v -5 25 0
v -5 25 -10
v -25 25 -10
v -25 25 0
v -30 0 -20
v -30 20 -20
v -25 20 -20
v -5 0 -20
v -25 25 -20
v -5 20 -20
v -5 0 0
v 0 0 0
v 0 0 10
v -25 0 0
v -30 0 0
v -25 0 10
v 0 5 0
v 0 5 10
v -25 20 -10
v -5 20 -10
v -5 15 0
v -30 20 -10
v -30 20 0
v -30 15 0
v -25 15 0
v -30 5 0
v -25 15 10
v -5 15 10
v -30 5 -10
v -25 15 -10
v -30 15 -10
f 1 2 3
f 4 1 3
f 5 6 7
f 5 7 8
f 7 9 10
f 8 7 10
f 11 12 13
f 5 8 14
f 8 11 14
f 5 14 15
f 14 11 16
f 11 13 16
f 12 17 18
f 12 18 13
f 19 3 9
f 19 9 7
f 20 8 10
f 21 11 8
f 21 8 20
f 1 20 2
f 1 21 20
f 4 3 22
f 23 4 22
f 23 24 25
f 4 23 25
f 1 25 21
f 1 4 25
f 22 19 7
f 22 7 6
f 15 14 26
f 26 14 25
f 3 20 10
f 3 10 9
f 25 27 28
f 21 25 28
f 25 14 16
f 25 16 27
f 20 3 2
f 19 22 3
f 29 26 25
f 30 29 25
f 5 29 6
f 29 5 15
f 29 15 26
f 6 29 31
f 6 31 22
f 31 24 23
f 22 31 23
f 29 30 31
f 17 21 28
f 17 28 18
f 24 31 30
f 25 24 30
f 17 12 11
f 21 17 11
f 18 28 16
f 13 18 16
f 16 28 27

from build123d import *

# Parameters (mm, degrees)
BOSS_EXTRUDE4_DEPTH  = 10
BOSS_EXTRUDE5_DEPTH  = 10
BOSS_EXTRUDE13_DEPTH = 10
SKETCH9_W            = 25
SKETCH9_H            = 20
BOSS_EXTRUDE14_DEPTH = 10
BOSS_EXTRUDE15_DEPTH = 10


with BuildPart() as part:
    # Sketch1 → Boss-Extrude4 (new body)
    with BuildSketch(Plane.XY):
        Polygon((-25, 0), (-25, 15), (-5, 15), (0, 5), (0, 0), align=None)
    extrude(amount=BOSS_EXTRUDE4_DEPTH)

    # Sketch3 → Boss-Extrude5 (add)
    with BuildSketch(Plane(origin=(0, 0, 0), x_dir=(-1, 0, 0), z_dir=(0, 0, -1))):
        Polygon((5, 15), (5, 0), (30, 0), (30, 5), (25, 15), align=None)
    extrude(amount=BOSS_EXTRUDE5_DEPTH)

    # Sketch4 → Boss-Extrude13 (add)
    with BuildSketch(Plane(origin=(0, 0, -10), x_dir=(-1, 0, 0), z_dir=(0, 0, -1))):
        Polygon((5, 15), (5, 25), (25, 25), (30, 20), (30, 15), align=None)
    extrude(amount=-BOSS_EXTRUDE13_DEPTH)

    # Sketch9 → Boss-Extrude14 (add)
    with BuildSketch(Plane(origin=(0, 0, -10), x_dir=(-1, 0, 0), z_dir=(0, 0, -1))):
        with Locations((17.5, 10)):
            Rectangle(SKETCH9_W, SKETCH9_H)
    extrude(amount=BOSS_EXTRUDE14_DEPTH)

    # Sketch10 → Boss-Extrude15 (add)
    with BuildSketch(Plane(origin=(0, 0, -10), x_dir=(-1, 0, 0), z_dir=(0, 0, -1))):
        Polygon((5, 20), (25, 25), (25, 20), align=None)
    extrude(amount=BOSS_EXTRUDE15_DEPTH)


solid = part.part
